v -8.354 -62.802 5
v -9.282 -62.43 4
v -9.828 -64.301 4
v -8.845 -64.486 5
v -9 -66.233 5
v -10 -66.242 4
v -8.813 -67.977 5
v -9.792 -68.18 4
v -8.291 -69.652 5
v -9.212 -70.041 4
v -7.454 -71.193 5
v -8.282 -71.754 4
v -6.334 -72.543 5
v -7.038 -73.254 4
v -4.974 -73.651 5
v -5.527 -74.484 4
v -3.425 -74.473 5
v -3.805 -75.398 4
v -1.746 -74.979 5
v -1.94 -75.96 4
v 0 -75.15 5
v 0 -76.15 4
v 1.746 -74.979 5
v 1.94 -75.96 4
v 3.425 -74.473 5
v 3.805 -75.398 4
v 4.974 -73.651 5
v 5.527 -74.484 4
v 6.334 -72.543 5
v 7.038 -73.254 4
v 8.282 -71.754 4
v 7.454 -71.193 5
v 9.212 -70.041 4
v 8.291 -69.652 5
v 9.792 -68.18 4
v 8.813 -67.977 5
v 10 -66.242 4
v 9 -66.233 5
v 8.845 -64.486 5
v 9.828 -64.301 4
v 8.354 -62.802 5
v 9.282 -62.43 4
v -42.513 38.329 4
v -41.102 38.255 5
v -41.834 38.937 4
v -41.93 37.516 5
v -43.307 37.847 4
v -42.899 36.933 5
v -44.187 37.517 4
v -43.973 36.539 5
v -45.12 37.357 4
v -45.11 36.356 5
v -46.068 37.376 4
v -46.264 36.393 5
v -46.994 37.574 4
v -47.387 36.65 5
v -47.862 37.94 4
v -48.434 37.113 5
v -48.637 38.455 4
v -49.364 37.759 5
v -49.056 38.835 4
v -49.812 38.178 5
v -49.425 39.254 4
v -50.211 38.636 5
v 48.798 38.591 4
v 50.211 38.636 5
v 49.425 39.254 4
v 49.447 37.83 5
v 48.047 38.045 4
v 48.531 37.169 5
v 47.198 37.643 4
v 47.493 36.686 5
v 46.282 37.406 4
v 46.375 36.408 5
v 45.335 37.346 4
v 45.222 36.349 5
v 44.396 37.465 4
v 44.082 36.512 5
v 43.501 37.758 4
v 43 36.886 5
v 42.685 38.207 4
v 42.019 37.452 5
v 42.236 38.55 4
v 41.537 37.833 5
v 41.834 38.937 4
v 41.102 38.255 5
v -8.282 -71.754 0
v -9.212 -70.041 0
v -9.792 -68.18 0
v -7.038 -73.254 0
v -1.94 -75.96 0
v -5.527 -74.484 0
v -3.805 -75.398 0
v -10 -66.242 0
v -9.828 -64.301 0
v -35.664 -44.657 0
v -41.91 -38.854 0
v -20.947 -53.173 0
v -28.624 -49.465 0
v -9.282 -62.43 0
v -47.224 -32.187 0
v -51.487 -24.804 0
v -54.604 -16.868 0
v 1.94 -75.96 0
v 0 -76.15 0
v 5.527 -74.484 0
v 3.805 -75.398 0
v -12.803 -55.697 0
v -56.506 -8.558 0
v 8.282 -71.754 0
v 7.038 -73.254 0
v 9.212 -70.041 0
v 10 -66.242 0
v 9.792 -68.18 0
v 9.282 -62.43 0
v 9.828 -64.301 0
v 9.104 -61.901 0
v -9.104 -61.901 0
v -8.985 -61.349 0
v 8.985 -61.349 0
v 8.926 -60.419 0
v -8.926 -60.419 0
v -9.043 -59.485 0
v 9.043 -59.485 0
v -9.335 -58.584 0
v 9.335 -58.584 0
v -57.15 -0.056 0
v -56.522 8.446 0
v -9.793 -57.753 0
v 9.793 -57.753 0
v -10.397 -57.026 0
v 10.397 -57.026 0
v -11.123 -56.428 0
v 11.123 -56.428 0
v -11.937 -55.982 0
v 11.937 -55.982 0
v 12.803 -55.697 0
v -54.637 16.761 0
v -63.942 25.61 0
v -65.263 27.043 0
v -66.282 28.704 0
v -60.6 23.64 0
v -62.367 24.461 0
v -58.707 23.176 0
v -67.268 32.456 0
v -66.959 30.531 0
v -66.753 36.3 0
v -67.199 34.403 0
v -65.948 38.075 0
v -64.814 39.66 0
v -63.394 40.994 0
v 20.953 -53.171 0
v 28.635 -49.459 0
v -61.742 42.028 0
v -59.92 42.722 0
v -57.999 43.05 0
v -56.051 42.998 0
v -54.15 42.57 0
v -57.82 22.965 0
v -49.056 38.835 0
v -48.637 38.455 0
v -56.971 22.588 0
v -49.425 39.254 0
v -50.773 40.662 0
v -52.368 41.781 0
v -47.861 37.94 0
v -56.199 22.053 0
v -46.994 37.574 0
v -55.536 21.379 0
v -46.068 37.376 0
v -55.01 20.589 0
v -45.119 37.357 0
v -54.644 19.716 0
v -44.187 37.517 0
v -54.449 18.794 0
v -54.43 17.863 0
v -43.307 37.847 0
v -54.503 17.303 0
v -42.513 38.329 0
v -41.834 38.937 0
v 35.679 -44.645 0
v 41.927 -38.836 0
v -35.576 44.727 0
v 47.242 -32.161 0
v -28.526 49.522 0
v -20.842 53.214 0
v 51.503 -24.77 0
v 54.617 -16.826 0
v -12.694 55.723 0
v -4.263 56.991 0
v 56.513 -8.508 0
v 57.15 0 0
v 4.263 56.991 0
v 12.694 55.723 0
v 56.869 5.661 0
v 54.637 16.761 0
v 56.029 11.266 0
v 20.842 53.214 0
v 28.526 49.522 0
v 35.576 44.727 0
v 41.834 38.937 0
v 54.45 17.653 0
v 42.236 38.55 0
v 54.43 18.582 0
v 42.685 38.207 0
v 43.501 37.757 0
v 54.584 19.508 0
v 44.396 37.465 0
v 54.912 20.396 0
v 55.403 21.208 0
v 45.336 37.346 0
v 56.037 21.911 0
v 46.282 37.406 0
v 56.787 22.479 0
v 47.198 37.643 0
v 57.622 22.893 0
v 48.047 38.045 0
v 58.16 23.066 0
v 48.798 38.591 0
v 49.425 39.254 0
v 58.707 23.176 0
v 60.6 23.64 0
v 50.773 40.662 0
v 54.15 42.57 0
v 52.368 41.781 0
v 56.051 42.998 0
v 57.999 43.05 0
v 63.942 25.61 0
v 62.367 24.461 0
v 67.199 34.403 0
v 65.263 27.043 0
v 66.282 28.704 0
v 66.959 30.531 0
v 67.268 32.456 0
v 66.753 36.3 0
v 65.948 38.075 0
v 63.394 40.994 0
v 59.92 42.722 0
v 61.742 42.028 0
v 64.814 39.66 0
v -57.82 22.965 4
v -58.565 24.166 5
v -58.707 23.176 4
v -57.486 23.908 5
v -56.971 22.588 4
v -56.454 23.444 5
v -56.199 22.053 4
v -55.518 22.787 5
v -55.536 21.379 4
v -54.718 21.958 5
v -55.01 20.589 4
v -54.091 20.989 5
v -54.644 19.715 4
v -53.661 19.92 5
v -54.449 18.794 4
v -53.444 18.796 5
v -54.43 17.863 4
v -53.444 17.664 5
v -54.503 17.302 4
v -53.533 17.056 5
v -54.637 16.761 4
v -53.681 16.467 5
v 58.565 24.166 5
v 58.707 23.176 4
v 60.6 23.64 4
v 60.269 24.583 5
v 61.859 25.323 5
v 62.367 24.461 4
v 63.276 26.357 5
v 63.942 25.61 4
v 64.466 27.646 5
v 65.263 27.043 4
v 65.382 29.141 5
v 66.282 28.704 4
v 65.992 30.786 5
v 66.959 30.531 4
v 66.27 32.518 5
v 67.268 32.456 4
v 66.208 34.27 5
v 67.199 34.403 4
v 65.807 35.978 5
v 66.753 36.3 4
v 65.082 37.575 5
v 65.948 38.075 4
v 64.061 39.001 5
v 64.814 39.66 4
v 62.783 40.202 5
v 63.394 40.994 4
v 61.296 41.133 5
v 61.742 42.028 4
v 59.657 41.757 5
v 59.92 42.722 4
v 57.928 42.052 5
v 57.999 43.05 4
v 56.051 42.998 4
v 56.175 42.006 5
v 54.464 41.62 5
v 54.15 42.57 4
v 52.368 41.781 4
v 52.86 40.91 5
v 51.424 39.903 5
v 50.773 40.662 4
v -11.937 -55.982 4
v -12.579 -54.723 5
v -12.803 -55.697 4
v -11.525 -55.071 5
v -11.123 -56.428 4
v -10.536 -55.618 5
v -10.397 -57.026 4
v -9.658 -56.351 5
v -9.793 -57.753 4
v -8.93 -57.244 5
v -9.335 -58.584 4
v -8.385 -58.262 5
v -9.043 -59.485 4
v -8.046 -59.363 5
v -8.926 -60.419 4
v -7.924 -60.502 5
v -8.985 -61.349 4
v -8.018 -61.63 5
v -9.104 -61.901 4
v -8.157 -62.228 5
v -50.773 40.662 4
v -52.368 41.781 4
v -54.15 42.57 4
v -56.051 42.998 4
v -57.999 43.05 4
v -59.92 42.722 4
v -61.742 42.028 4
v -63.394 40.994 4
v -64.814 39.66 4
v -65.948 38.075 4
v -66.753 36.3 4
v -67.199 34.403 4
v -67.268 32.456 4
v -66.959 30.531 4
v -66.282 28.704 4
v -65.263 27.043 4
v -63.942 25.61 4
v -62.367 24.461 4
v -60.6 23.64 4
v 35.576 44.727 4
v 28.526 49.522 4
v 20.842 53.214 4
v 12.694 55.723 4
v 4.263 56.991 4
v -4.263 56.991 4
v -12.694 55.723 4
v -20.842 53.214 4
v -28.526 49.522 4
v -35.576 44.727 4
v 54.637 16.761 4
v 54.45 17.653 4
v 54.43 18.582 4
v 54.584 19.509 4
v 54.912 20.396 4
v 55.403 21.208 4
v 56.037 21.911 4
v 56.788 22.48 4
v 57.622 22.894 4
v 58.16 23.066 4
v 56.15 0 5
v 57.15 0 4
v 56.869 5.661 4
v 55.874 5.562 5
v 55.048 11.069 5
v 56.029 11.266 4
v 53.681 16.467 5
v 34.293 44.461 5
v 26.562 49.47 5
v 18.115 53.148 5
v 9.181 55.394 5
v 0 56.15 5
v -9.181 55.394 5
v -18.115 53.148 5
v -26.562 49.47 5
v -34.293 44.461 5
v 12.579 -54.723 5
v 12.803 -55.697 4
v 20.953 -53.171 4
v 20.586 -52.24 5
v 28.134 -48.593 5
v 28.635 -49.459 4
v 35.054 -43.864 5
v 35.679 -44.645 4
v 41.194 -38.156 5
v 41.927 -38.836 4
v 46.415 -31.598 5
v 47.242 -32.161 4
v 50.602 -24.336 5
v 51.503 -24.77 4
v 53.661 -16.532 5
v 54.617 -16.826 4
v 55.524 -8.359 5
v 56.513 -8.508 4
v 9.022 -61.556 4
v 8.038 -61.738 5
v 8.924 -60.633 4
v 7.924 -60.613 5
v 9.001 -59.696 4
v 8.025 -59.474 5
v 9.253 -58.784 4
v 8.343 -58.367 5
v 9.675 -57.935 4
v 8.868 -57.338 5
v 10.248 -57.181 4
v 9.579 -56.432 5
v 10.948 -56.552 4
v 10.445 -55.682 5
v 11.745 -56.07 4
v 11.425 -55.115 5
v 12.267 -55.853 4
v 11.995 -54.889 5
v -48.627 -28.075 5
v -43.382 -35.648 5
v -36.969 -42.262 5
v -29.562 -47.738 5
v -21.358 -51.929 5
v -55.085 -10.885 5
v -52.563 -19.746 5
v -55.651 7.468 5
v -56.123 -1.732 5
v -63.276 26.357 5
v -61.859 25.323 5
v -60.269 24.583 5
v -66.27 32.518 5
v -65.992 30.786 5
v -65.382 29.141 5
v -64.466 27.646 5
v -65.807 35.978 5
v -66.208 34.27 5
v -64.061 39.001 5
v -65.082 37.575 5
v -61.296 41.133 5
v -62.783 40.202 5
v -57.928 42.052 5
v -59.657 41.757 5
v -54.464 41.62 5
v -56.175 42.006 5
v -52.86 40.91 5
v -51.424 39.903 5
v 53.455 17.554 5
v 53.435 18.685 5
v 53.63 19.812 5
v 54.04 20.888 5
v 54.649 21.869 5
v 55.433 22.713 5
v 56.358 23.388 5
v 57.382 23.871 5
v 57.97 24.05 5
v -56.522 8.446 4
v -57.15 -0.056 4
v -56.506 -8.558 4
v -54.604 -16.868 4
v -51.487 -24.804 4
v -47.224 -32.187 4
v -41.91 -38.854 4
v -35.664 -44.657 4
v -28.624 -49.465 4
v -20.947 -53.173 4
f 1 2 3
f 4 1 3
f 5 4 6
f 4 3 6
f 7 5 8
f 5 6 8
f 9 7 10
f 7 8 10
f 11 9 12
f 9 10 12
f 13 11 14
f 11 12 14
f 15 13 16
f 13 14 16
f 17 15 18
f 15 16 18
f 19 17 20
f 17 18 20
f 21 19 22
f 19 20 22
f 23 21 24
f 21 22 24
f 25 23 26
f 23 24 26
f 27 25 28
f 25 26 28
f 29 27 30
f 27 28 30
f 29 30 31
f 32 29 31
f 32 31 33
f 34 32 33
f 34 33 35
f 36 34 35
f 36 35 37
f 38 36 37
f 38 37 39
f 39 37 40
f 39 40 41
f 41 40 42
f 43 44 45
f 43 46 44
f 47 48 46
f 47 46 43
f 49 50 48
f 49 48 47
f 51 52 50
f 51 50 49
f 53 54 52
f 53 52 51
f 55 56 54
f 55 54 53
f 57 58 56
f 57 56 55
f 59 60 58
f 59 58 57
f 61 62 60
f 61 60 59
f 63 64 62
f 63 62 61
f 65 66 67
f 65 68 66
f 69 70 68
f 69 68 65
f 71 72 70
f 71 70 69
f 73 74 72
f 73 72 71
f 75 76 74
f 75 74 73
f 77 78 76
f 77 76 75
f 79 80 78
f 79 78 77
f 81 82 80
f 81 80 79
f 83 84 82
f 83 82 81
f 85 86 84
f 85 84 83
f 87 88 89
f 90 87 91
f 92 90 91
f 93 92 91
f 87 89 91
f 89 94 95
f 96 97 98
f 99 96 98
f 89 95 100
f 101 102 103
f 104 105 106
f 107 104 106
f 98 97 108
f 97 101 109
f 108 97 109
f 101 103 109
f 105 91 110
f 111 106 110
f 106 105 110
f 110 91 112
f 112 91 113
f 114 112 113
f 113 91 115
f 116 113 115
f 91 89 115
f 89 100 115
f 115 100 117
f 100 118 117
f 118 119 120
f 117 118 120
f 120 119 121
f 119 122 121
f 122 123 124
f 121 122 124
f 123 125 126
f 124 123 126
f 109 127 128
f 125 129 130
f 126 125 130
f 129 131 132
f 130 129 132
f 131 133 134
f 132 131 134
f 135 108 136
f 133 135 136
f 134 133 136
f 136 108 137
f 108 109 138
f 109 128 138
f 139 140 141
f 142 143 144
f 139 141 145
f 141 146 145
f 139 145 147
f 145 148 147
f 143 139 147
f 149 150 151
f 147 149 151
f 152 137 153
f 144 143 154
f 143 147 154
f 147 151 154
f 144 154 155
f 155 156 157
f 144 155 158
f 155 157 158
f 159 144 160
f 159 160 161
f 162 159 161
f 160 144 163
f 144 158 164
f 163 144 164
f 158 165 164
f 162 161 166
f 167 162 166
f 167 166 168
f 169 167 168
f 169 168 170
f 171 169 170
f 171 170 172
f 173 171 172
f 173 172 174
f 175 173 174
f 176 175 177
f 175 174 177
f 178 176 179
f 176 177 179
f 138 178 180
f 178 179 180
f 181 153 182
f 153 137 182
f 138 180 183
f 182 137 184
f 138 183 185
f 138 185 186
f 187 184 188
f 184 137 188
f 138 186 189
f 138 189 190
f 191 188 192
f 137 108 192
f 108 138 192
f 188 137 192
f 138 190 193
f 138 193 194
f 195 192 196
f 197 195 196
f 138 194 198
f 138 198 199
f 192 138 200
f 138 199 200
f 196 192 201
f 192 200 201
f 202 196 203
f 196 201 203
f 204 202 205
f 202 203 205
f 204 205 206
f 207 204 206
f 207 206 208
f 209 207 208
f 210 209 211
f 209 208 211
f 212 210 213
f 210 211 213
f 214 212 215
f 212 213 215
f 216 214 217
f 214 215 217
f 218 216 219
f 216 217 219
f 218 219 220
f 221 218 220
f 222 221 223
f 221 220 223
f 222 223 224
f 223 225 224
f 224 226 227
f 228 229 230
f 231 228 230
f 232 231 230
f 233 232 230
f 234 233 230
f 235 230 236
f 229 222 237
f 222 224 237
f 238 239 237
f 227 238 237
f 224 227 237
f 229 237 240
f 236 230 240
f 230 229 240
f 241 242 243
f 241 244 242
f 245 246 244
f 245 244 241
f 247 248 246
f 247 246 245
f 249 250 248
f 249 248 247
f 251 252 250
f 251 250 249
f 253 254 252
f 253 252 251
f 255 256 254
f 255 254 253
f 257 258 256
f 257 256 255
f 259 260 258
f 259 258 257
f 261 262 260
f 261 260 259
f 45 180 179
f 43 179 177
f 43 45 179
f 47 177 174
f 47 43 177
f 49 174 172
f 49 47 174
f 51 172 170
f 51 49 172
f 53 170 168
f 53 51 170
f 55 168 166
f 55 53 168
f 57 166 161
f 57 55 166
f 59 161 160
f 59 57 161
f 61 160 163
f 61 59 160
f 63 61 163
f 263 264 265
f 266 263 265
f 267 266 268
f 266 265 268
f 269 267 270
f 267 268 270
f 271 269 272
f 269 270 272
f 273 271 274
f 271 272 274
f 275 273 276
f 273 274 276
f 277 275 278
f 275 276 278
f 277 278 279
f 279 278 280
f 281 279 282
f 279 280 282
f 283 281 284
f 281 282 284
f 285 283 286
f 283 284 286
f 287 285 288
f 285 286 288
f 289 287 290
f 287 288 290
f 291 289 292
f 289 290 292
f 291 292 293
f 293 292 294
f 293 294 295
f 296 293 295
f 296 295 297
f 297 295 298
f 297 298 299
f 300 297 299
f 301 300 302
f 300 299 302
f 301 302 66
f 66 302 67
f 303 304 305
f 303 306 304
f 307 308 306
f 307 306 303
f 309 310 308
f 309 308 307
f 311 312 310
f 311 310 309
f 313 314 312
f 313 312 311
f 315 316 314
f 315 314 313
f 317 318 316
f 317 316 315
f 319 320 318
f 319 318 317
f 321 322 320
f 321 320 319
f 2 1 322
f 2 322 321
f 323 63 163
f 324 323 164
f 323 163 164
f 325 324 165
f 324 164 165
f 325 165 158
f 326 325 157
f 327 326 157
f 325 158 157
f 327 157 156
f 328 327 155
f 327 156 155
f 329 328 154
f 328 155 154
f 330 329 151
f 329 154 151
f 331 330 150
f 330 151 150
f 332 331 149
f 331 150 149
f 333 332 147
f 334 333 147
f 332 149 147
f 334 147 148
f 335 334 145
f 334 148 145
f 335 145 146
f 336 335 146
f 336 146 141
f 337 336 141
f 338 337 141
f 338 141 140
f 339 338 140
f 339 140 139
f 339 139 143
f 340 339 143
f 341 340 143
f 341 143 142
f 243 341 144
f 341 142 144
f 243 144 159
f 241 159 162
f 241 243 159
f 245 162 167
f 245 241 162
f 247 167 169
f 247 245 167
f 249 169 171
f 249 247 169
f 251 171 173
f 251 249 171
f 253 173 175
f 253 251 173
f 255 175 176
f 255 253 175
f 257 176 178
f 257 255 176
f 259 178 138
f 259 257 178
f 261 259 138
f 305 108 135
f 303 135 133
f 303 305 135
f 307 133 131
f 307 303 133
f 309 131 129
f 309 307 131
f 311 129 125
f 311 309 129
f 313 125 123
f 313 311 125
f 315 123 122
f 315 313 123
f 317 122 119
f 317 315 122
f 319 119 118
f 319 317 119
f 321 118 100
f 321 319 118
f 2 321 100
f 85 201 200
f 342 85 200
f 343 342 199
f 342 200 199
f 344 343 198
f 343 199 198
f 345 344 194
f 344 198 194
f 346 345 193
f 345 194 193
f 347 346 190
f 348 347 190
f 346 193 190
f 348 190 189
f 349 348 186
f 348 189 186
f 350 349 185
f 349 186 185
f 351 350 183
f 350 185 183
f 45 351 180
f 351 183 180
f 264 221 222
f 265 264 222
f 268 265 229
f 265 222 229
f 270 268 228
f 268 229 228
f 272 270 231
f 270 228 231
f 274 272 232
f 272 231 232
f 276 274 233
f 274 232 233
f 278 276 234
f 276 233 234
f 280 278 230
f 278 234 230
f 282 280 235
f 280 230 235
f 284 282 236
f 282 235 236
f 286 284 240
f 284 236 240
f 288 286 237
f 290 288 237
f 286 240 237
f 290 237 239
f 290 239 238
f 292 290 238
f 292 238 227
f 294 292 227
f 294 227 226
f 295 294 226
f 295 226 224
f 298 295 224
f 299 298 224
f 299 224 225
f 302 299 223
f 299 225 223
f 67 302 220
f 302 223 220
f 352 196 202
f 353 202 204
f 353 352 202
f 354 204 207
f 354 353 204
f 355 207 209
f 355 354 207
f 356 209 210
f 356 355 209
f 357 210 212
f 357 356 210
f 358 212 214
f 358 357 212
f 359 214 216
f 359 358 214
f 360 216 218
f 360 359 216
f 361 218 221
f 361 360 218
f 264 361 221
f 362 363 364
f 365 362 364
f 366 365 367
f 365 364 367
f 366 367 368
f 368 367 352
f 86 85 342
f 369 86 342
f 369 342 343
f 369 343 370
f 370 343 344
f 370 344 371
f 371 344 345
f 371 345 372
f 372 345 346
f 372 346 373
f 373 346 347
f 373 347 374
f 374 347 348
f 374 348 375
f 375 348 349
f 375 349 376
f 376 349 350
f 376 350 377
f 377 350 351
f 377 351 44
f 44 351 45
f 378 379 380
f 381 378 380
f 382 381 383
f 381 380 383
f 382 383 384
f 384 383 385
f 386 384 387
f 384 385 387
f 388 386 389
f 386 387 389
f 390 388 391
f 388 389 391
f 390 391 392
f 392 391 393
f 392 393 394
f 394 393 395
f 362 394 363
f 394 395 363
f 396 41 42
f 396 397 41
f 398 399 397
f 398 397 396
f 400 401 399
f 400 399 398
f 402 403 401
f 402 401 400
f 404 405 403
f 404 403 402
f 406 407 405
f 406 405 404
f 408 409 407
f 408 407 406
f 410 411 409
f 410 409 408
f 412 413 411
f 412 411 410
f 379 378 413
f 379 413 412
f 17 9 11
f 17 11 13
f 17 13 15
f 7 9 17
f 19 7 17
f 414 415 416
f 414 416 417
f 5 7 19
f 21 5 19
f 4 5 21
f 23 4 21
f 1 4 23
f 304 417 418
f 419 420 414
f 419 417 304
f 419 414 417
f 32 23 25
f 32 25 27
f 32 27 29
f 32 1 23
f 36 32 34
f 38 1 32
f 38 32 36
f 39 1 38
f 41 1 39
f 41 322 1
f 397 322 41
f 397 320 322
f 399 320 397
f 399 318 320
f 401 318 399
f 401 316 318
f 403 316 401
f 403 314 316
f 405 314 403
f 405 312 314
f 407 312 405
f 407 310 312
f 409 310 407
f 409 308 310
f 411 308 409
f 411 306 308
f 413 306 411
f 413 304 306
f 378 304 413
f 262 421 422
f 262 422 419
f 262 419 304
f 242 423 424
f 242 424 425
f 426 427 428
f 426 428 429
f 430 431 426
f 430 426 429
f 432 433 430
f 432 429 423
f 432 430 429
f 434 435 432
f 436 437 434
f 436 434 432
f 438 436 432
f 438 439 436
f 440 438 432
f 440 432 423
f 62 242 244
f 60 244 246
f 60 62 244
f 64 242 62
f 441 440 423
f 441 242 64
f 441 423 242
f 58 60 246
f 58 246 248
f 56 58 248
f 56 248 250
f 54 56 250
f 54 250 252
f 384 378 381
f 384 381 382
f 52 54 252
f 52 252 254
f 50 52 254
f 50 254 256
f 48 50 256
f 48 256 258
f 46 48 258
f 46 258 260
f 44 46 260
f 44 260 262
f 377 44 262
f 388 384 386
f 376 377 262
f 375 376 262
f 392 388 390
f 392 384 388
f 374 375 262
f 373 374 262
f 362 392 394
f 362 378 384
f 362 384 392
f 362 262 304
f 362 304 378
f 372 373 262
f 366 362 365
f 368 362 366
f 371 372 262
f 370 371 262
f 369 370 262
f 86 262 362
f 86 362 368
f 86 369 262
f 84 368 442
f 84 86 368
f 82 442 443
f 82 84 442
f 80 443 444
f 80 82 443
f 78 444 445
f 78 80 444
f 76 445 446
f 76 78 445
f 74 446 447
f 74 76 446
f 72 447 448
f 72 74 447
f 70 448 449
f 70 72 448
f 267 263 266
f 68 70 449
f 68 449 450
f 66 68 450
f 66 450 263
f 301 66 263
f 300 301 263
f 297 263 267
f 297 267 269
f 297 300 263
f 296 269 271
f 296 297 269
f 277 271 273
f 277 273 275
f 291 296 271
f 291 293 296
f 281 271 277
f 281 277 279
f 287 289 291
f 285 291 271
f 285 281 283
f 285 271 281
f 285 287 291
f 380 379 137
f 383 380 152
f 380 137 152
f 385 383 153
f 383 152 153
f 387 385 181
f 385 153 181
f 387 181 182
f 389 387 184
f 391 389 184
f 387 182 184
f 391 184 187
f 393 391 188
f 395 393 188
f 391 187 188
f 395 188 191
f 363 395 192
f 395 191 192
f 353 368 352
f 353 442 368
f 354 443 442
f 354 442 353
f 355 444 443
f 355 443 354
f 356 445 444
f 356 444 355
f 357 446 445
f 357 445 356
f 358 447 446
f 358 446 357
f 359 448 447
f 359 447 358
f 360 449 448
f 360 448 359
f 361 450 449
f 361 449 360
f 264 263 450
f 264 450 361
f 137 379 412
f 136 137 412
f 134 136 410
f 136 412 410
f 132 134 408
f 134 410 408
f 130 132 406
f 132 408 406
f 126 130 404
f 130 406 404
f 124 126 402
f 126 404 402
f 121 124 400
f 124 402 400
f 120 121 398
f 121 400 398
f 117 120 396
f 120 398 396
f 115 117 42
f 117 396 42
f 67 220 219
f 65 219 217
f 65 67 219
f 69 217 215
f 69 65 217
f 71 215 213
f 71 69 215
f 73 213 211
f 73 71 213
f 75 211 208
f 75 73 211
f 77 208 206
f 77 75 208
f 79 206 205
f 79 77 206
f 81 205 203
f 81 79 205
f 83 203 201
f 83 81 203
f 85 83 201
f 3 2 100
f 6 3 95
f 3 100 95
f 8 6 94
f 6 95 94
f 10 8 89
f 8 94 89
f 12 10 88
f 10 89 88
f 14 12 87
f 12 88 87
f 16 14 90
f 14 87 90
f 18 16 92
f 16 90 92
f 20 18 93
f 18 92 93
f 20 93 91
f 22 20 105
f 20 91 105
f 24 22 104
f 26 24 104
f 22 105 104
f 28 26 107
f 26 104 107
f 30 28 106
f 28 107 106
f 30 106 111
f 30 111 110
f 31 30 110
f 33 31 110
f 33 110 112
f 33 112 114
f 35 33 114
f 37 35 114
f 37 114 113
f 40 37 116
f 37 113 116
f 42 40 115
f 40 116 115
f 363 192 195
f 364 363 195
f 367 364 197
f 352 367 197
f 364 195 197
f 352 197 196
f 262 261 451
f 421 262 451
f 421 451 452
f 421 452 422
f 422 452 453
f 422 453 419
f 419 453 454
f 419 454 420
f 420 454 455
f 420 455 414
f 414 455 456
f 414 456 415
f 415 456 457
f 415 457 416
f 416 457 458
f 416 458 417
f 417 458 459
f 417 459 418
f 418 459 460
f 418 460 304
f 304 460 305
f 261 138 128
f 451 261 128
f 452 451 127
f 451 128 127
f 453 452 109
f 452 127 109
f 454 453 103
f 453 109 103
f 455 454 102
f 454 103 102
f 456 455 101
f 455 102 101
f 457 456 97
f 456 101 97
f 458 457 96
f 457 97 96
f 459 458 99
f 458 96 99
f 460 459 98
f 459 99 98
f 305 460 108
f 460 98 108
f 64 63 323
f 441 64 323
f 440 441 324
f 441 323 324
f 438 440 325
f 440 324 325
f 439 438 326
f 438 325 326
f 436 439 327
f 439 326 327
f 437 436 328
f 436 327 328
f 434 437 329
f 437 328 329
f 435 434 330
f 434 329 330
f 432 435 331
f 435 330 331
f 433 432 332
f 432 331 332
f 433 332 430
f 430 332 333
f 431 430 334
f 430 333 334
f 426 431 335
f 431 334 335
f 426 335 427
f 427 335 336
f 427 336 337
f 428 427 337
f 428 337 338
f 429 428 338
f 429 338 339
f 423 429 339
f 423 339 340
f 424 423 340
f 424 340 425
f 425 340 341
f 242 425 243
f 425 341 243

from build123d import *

# Parameters (mm, degrees)
F1_DEPTH = 5
F2_R     = 5
F3_SIZE  = 1


with BuildPart() as f1:
    # F0 (on Top) → F1 (new body)
    with BuildSketch(Plane.XY):
        with BuildLine():
            ThreePointArc((4.0489926269, -57.0063869992), (41.8181923846, -38.9533218826), (57.15, 0))
            ThreePointArc((57.15, 0), (55.6922778867, 12.8254701198), (51.3934756327, 24.996663025))
            ThreePointArc((51.3934756327, 24.996663025), (49.4933518263, 28.575), (47.3444830059, 32.0097239742))
            ThreePointArc((47.3444830059, 32.0097239742), (0, 57.15), (-47.3444830059, 32.0097239742))
            ThreePointArc((-47.3444830059, 32.0097239742), (-49.4933518263, 28.575), (-51.3934756327, 24.996663025))
            ThreePointArc((-51.3934756327, 24.996663025), (-49.4933518263, -28.575), (-4.0489926269, -57.0063869992))
            ThreePointArc((-4.0489926269, -57.0063869992), (0, -57.15), (4.0489926269, -57.0063869992))
        make_face()
        with BuildLine():
            ThreePointArc((47.3444830059, 32.0097239742), (49.4933518263, 28.575), (51.3934756327, 24.996663025))
            ThreePointArc((51.3934756327, 24.996663025), (65.9478344982, 38.075), (47.3444830059, 32.0097239742))
        make_face()
        with BuildLine():
            ThreePointArc((-51.3934756327, 24.996663025), (-49.4933518263, 28.575), (-47.3444830059, 32.0097239742))
            ThreePointArc((-47.3444830059, 32.0097239742), (-65.9478344982, 38.075), (-51.3934756327, 24.996663025))
        make_face()
        with BuildLine():
            ThreePointArc((-4.0489926269, -57.0063869992), (0, -76.15), (4.0489926269, -57.0063869992))
            ThreePointArc((4.0489926269, -57.0063869992), (0, -57.15), (-4.0489926269, -57.0063869992))
        make_face()
    extrude(amount=F1_DEPTH)

    # F2
    f2_edges = [f1.edges().sort_by_distance(p)[0] for p in [
        (51.393476, 24.996663, 2.5),
        (-4.048993, -57.006387, 2.5),
        (-47.344483, 32.009724, 2.5),
        (47.344483, 32.009724, 2.5),
        (-51.393476, 24.996663, 2.5),
        (4.048993, -57.006387, 2.5),
    ]]
    fillet(f2_edges, radius=F2_R)

    # F3
    f3_edges = [f1.edges().sort_by_distance(p)[0] for p in [
        (0, 57.15, 5),
        (45.702262, 37.347671, 5),
        (-45.702262, 37.347671, 5),
        (65.947834, 38.075, 5),
        (-65.947834, 38.075, 5),
        (55.195163, 20.905484, 5),
        (-55.195163, 20.905484, 5),
        (49.493352, -28.575, 5),
        (-49.493352, -28.575, 5),
        (9.492901, -58.253155, 5),
        (-9.492901, -58.253155, 5),
        (0, -76.15, 5),
    ]]
    chamfer(f3_edges, length=F3_SIZE)


solid = f1.part
